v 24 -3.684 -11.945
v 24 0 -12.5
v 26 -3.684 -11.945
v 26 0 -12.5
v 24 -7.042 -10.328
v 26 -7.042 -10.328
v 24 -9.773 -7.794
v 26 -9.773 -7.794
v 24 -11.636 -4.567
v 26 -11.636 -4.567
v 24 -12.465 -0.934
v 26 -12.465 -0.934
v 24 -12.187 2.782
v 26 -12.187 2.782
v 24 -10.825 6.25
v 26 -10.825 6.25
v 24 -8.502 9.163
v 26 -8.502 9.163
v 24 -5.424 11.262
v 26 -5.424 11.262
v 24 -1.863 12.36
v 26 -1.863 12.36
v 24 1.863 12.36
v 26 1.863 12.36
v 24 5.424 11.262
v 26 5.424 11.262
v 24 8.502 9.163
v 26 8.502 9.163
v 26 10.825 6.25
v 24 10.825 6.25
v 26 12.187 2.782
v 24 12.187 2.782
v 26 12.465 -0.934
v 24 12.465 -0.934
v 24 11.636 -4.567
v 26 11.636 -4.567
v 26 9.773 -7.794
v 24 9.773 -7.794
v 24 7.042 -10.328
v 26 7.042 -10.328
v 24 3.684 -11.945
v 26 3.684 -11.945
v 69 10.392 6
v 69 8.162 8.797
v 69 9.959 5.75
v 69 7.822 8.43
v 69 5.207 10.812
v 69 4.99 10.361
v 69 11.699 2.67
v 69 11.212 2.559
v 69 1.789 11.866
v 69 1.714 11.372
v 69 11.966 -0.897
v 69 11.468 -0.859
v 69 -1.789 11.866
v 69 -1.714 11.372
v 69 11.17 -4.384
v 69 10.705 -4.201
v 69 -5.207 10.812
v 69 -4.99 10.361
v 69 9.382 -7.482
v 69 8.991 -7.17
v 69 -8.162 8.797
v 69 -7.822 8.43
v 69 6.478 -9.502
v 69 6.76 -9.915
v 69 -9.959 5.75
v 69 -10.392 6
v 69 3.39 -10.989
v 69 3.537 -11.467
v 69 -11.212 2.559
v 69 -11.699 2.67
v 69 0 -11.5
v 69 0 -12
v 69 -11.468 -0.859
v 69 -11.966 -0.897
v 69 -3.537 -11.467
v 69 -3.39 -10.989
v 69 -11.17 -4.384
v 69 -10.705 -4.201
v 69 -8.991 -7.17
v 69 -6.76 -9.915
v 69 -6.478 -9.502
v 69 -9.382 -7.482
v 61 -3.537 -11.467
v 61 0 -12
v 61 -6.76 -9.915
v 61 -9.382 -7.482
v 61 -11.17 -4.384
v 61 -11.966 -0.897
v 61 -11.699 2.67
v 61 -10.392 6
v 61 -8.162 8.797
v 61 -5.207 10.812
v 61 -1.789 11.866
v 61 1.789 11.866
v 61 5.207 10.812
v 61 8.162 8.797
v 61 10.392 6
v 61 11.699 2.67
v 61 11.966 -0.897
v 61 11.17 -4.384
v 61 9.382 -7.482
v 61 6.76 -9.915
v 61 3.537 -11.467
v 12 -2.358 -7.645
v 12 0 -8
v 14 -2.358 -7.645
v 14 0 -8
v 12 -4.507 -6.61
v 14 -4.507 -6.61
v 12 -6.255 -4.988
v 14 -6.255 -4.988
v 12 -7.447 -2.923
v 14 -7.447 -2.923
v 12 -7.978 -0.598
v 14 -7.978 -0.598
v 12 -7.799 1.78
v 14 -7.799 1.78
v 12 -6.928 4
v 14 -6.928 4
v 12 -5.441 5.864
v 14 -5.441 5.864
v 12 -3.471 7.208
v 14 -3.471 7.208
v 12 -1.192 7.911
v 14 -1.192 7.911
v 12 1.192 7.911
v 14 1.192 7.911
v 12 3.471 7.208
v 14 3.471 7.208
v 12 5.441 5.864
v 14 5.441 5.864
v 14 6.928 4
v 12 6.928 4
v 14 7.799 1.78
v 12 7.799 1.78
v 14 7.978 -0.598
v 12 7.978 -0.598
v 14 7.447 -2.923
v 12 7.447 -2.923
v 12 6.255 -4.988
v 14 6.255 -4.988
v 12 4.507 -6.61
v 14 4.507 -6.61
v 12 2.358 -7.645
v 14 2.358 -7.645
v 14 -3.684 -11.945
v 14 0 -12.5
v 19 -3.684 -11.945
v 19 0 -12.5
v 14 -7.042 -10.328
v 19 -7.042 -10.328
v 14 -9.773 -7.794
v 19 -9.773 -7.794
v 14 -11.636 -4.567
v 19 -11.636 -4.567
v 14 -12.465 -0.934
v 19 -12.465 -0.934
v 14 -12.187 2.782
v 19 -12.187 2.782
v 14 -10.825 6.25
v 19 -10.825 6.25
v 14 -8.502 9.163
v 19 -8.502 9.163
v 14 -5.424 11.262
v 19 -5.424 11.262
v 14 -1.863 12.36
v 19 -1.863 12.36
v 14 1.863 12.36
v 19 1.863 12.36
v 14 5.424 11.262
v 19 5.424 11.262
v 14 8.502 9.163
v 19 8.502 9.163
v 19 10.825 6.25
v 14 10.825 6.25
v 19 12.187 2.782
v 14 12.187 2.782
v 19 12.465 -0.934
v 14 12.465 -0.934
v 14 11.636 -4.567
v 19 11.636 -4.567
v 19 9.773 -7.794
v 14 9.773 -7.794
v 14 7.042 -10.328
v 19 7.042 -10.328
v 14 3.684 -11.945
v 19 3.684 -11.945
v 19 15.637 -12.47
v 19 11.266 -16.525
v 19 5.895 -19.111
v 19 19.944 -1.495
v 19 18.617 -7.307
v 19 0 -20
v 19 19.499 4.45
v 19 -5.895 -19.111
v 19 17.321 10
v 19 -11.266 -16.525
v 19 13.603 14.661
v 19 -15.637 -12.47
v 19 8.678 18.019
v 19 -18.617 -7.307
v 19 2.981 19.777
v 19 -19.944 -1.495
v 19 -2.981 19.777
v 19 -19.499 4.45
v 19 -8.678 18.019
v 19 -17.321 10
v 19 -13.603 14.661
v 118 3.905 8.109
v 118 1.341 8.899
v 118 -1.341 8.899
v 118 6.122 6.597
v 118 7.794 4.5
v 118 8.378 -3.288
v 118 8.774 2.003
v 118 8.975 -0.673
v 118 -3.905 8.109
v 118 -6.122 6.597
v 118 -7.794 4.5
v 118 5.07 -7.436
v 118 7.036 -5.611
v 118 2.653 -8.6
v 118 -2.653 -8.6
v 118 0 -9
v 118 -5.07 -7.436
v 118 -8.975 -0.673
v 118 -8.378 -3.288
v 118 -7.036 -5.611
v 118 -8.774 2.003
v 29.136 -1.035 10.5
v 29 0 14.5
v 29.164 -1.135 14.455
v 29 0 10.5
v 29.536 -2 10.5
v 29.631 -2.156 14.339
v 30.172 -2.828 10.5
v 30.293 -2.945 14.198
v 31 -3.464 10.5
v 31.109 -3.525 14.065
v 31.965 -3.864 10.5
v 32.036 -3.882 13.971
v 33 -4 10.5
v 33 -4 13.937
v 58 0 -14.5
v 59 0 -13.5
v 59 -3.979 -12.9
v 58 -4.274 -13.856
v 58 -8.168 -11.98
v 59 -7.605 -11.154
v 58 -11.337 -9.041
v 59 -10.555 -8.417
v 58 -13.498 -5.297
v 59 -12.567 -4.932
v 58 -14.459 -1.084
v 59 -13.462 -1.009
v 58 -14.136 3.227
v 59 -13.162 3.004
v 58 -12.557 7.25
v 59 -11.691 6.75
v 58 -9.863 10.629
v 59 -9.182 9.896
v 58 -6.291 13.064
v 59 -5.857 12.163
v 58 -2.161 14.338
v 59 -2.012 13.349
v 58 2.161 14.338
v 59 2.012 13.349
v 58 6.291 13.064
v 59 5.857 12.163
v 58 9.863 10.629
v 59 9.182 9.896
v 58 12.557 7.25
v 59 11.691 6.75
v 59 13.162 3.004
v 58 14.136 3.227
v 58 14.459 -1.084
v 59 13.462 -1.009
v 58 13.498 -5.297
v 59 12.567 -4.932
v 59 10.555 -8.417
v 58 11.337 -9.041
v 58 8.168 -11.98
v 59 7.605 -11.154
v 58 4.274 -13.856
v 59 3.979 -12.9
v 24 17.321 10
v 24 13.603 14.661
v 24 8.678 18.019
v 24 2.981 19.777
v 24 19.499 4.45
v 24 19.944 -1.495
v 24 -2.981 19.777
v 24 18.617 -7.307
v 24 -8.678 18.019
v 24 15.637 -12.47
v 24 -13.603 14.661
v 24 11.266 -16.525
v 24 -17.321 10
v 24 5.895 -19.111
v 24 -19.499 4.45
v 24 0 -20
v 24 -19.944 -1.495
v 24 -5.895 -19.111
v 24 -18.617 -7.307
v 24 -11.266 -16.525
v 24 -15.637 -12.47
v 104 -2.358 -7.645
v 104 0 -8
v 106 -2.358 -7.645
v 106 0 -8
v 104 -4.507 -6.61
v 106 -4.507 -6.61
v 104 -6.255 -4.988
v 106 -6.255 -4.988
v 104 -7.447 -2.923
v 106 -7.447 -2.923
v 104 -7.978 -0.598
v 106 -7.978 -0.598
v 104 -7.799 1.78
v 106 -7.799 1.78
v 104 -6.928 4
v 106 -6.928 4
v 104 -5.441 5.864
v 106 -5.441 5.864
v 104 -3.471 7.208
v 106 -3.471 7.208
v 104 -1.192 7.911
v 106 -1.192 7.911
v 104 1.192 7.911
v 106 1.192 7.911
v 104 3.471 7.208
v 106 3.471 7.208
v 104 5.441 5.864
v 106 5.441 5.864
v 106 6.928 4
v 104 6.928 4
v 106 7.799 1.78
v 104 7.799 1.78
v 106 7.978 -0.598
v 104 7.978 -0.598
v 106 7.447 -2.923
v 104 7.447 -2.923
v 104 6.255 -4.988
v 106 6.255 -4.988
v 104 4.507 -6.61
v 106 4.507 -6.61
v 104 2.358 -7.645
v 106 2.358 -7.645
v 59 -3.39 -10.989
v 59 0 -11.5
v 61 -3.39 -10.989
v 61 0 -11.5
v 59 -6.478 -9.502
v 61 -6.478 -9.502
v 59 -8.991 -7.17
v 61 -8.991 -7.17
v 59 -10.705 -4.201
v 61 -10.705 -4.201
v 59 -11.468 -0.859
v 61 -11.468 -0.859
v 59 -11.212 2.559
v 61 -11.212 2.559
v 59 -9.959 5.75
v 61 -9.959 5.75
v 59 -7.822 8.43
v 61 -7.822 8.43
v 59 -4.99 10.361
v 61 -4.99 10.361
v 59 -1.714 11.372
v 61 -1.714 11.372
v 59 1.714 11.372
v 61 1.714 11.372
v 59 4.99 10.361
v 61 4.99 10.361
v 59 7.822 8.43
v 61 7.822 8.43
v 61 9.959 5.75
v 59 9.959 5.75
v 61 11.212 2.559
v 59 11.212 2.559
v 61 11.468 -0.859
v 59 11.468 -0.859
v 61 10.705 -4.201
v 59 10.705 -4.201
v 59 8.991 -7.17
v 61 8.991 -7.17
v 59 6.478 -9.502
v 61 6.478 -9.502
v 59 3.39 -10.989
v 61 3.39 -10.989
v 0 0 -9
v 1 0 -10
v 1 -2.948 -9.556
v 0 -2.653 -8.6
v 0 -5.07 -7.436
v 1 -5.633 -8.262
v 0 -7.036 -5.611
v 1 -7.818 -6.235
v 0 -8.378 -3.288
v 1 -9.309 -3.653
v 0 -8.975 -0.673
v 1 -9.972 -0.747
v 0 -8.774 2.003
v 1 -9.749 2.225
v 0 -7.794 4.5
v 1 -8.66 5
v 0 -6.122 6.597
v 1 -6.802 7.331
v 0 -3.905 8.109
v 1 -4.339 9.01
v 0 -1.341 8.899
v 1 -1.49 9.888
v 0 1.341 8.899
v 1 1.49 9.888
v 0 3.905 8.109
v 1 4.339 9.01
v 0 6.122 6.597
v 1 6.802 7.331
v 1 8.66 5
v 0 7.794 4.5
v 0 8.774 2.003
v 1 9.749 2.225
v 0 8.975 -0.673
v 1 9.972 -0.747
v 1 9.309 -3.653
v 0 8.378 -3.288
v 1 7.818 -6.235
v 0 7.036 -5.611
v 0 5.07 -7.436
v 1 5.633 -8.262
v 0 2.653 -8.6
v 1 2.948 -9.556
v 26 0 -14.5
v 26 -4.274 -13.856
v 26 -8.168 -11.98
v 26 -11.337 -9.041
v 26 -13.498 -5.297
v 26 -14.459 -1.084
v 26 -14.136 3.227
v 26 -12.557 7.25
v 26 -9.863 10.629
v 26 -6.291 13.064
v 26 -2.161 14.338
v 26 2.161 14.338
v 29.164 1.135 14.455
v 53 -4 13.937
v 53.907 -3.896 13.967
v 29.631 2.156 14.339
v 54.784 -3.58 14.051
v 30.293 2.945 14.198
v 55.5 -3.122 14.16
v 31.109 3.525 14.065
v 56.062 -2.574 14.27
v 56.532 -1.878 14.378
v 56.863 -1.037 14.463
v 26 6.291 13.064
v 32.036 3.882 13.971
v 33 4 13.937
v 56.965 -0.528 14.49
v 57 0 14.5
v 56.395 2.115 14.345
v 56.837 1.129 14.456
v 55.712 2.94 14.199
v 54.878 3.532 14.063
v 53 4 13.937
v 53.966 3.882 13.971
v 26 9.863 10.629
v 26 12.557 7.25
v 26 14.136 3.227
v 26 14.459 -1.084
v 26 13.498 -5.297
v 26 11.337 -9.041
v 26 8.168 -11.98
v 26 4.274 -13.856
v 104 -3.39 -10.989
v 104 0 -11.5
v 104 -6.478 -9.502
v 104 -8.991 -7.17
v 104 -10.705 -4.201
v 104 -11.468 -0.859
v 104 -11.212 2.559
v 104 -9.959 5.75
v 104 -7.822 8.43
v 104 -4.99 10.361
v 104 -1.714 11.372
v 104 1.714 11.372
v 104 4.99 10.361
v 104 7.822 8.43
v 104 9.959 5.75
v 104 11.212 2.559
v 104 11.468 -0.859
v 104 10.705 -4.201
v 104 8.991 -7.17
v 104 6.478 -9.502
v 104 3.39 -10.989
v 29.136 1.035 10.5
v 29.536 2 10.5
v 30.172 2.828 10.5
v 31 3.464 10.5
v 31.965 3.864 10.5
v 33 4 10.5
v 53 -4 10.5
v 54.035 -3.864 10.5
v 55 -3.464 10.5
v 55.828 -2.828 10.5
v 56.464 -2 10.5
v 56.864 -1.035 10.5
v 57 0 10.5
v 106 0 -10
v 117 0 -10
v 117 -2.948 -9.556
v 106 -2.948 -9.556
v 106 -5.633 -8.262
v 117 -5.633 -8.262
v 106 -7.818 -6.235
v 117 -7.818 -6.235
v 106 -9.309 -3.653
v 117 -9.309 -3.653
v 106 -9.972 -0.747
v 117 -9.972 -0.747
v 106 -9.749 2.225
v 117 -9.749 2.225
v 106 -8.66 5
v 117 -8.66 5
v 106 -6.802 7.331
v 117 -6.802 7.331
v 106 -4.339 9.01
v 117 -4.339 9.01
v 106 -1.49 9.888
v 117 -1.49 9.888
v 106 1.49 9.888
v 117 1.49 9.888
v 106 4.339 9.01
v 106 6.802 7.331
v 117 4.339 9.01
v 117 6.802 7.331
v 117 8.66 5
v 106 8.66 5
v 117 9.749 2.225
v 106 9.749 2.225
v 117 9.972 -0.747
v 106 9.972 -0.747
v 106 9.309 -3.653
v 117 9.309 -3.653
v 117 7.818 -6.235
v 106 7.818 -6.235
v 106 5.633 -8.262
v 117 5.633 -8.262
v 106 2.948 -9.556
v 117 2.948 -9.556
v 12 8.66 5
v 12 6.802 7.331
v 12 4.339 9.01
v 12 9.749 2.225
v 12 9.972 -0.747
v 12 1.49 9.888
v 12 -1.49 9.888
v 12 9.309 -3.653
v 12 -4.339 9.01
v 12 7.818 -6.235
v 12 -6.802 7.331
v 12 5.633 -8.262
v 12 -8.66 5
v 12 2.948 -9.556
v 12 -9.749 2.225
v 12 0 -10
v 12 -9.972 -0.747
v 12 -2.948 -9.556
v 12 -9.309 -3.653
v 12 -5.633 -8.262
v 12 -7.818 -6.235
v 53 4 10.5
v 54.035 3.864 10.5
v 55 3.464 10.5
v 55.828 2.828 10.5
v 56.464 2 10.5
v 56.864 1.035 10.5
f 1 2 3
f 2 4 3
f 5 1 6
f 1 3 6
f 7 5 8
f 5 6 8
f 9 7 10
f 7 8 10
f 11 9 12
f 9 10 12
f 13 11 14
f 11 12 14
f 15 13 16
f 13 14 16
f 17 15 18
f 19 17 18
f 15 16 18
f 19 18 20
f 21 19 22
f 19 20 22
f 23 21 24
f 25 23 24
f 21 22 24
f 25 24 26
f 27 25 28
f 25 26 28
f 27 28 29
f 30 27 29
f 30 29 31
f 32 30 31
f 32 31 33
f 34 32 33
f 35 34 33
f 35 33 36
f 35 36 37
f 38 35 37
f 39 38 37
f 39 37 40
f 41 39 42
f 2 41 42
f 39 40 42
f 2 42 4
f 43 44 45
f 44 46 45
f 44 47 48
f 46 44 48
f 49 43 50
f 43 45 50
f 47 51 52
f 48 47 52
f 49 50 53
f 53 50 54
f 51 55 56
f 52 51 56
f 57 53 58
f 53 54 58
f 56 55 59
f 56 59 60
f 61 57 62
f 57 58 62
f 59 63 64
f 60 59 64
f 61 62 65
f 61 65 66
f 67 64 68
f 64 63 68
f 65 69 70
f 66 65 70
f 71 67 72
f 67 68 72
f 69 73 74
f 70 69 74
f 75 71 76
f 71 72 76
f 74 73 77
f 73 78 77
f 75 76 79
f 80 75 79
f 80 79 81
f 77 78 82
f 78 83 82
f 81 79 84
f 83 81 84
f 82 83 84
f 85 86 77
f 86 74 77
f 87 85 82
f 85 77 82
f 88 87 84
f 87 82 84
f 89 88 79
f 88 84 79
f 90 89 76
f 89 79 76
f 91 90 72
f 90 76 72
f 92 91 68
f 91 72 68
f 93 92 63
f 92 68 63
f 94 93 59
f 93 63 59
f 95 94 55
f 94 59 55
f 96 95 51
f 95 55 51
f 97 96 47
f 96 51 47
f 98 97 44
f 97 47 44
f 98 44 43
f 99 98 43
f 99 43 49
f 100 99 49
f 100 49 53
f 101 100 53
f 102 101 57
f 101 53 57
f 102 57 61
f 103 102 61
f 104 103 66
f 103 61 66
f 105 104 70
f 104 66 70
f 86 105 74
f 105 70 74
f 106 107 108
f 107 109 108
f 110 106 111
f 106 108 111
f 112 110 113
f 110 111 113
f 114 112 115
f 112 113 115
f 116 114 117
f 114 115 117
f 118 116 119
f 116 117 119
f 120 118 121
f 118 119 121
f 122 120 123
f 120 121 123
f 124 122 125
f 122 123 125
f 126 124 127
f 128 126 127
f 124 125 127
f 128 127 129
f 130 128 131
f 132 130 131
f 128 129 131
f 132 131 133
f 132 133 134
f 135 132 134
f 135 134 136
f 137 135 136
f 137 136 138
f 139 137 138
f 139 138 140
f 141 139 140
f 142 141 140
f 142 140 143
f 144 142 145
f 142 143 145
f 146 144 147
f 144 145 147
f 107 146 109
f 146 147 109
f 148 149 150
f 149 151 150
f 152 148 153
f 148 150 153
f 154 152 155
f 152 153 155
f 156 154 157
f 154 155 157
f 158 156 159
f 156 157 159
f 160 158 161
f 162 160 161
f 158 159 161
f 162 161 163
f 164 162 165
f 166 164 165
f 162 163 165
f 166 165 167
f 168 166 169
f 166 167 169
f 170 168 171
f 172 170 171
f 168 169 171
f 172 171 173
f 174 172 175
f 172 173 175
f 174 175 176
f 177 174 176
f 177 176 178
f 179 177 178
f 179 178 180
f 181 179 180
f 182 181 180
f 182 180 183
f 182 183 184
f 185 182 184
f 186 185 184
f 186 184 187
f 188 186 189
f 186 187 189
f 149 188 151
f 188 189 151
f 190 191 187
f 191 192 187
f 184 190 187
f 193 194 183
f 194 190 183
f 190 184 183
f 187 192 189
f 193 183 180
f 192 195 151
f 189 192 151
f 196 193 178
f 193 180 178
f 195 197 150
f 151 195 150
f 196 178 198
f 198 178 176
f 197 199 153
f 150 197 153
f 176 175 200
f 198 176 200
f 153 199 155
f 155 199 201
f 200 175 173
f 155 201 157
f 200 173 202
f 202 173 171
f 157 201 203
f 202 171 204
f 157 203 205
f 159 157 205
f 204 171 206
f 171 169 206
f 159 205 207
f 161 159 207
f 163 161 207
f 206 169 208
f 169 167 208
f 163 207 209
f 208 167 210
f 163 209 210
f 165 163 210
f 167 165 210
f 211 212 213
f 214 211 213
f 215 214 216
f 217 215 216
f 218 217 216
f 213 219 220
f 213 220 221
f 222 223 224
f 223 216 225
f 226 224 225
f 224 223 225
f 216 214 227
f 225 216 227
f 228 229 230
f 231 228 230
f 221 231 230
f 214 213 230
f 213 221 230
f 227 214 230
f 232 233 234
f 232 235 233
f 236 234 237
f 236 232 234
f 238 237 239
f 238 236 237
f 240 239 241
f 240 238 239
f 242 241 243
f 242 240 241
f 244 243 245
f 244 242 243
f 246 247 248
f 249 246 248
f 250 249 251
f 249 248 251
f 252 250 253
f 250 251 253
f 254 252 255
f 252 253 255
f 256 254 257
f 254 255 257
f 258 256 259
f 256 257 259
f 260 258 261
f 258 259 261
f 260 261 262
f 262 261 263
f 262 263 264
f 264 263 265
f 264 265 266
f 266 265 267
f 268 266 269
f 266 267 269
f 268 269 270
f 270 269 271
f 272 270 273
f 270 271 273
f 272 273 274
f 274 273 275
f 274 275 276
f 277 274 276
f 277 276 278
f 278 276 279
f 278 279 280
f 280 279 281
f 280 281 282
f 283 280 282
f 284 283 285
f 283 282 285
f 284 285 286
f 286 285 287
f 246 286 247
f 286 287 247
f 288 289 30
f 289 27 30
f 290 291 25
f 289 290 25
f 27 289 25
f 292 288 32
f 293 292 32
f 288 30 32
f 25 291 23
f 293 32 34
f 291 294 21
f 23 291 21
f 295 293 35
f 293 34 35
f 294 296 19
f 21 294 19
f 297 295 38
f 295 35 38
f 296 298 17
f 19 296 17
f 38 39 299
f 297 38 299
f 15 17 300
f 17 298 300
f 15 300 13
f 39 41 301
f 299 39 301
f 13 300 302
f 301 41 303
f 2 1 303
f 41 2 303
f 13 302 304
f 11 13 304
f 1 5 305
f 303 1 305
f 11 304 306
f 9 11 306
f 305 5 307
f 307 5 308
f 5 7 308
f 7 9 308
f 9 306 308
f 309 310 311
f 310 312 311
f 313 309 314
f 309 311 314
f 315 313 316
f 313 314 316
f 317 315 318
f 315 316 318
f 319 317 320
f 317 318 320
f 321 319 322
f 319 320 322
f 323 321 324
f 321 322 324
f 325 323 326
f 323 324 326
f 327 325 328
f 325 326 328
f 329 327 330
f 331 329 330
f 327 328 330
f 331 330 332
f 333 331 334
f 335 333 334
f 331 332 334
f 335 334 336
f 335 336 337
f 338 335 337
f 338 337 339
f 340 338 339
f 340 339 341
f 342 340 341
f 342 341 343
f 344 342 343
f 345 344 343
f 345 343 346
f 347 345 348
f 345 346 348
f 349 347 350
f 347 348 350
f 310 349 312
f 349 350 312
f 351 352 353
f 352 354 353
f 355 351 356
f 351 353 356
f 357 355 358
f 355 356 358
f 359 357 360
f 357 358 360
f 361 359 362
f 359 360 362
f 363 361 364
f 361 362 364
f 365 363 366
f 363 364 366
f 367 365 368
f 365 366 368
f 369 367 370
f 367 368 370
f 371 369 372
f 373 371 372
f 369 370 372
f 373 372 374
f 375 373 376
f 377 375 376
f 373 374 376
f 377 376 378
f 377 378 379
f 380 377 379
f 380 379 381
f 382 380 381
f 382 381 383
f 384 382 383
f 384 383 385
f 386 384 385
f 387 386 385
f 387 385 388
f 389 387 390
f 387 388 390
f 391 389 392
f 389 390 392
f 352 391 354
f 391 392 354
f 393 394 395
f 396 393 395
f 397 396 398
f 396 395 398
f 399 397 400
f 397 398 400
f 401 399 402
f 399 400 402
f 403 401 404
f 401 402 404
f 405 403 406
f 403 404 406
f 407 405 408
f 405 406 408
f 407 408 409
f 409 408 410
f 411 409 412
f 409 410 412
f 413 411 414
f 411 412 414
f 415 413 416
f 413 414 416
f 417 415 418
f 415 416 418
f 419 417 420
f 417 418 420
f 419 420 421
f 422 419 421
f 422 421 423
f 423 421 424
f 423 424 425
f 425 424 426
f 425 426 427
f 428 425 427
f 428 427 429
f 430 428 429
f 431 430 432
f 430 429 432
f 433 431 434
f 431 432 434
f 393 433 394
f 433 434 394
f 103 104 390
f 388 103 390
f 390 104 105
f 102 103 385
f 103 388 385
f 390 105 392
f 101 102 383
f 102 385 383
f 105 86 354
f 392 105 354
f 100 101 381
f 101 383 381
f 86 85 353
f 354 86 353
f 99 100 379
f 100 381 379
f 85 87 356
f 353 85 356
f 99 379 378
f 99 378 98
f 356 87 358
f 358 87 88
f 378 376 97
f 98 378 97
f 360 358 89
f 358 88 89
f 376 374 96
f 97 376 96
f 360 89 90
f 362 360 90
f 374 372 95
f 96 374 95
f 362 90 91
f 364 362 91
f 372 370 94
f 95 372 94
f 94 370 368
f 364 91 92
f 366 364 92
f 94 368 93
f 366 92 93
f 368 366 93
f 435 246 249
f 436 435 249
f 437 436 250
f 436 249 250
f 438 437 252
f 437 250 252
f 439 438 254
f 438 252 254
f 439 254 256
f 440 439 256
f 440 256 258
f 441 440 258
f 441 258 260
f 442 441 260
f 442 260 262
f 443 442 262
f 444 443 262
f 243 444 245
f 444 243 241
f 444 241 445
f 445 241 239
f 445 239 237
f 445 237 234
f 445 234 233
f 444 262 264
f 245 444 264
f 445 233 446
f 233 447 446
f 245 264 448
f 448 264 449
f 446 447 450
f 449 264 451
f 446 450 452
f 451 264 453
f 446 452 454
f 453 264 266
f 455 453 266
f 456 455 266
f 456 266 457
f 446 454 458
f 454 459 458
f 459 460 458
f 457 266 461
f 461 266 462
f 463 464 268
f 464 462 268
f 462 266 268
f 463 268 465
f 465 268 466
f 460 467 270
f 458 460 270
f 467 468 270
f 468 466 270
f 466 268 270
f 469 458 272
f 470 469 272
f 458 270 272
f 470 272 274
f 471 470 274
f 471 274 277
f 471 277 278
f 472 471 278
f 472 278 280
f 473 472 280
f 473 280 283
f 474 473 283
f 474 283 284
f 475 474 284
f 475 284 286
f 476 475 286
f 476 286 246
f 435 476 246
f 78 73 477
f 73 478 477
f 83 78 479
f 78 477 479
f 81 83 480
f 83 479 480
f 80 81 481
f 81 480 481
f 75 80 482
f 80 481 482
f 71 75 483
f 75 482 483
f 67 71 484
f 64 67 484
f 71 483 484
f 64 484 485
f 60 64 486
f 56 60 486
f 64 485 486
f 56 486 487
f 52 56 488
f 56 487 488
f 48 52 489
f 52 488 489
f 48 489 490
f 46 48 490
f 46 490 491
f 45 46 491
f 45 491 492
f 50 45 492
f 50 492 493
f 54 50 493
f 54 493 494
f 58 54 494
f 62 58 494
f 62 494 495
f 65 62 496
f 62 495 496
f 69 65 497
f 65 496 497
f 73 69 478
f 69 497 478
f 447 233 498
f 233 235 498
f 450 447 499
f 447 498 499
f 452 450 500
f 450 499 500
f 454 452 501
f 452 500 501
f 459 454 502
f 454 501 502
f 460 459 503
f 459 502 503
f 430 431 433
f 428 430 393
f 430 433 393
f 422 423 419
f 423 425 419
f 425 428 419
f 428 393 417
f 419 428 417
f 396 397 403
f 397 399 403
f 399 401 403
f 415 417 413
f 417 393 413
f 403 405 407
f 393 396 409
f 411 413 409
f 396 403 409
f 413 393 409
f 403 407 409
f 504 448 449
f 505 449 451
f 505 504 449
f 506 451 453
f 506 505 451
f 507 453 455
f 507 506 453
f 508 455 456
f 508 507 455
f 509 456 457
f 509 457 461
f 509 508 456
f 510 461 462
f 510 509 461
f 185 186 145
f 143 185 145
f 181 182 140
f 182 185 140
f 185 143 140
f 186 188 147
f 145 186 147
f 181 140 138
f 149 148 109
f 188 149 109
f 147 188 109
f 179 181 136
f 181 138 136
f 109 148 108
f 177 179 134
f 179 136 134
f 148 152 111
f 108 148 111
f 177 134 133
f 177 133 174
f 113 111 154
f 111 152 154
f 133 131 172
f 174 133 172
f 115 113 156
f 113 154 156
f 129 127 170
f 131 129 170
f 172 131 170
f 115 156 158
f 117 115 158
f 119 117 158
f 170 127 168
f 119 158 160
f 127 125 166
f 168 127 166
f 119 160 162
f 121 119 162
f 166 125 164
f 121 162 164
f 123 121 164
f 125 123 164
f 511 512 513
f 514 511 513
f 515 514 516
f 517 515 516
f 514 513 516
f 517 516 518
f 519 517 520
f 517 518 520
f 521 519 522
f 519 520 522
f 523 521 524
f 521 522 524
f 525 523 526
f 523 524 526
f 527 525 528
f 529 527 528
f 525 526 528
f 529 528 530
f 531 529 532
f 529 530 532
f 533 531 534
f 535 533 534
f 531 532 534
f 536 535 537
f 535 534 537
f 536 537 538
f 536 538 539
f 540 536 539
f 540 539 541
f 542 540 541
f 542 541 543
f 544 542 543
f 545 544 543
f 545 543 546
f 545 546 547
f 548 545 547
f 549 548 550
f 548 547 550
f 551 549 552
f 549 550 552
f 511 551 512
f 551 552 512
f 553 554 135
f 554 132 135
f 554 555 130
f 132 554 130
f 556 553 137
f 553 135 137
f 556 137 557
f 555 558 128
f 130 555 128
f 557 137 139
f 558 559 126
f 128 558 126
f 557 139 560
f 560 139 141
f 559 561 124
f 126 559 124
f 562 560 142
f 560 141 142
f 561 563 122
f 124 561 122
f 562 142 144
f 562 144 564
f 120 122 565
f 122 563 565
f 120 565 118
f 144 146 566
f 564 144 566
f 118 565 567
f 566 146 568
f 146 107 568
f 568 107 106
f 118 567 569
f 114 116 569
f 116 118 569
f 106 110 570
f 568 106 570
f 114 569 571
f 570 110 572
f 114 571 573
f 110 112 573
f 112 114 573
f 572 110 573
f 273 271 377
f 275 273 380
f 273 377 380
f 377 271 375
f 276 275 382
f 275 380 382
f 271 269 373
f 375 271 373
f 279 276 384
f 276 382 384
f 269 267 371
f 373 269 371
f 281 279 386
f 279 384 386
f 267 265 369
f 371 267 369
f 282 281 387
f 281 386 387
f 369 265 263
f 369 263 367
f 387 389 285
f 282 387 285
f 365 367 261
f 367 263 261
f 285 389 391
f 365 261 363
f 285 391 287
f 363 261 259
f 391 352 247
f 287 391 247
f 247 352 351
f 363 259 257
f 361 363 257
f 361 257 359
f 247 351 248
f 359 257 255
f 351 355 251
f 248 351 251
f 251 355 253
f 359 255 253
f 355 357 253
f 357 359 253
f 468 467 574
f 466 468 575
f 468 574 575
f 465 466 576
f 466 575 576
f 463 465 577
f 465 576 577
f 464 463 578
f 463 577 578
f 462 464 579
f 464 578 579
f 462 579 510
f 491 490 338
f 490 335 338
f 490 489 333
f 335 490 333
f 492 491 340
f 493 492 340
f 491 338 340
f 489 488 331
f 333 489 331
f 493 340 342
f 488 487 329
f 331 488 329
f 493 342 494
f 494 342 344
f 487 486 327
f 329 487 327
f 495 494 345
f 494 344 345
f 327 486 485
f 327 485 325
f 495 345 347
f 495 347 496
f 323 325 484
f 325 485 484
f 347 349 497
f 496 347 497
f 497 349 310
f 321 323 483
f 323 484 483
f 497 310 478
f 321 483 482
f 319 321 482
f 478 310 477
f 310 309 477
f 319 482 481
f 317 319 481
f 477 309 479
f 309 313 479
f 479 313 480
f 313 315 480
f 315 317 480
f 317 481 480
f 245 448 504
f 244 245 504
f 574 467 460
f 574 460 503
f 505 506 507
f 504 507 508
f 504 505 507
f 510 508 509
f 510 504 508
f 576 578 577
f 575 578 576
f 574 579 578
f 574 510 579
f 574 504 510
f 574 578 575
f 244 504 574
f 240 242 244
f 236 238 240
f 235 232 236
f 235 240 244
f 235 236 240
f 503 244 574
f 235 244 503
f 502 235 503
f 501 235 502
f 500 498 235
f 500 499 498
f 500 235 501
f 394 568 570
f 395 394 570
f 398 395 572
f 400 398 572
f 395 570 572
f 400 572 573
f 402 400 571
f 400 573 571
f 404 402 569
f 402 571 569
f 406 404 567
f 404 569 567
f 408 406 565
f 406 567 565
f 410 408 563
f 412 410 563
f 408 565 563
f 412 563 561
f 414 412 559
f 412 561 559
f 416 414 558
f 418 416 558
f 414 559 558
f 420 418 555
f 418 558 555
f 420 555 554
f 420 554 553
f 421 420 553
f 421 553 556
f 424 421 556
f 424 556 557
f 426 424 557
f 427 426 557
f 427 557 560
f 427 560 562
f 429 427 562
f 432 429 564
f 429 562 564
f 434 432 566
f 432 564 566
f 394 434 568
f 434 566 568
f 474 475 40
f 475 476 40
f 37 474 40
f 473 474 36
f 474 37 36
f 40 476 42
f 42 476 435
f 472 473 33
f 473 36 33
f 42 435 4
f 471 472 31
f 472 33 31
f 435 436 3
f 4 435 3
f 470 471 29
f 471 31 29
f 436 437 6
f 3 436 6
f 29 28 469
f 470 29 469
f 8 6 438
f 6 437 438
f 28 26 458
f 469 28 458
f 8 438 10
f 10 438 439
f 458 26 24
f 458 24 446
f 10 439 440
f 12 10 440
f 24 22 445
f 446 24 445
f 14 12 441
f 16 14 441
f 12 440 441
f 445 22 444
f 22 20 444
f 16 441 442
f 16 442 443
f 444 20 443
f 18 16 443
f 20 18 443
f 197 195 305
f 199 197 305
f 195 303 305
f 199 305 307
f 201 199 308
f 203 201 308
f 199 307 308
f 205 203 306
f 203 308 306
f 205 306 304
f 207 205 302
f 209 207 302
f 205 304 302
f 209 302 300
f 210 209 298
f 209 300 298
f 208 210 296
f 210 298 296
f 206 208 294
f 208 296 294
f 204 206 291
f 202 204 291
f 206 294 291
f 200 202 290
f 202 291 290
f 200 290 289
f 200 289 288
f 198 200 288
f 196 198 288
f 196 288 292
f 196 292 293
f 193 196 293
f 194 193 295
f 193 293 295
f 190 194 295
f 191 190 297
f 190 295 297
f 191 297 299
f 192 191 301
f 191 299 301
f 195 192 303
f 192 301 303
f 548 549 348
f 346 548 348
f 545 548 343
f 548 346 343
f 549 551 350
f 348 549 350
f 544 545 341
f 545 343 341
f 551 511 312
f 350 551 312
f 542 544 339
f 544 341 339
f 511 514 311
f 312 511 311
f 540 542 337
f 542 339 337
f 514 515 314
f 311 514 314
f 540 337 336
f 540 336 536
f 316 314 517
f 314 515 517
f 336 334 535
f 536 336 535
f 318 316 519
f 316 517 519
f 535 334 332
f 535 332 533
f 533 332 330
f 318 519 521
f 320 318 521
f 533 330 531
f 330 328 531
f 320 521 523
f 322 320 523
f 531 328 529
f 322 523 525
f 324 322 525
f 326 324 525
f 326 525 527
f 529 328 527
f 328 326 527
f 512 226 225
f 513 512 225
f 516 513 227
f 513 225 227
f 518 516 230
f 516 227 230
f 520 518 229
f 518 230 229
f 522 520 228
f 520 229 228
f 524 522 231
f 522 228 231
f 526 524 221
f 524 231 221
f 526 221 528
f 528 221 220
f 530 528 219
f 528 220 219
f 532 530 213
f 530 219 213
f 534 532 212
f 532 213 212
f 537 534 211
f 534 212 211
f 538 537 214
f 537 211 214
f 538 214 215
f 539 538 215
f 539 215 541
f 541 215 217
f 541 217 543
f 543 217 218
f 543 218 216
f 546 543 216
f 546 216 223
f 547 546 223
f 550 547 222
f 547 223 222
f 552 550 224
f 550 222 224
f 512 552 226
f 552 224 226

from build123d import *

# Parameters (mm, degrees)
CHAMFER_1_SIZE      = 1
SKETCH_2_W          = 5.515970317
SKETCH_2_H          = 8
CUT_EXTRUDE_1_DEPTH = 28
FILLET_1_R          = 4
FILLET_2_R          = 4


with BuildPart() as part:
    # 草图1 → 旋转1 (revolve)
    with BuildSketch(Plane.XY, mode=Mode.PRIVATE) as revolve_1_sk:
        Polygon((0, 0), (0, 10), (12, 10), (12, 8), (14, 8), (14, 12.5), (19, 12.5), (19, 20), (24, 20), (24, 12.5), (26, 12.5), (26, 14.5), (59, 14.5), (59, 11.5), (61, 11.5), (61, 12), (69, 12), (69, 11.5), (104, 11.5), (104, 8), (106, 8), (106, 10), (118, 10), (118, 0), align=None)
    revolve(revolve_1_sk.sketch.rotate(Axis((0, 0, 0), (-1, 0, 0)), 90), axis=Axis((0, 0, 0), (-1, 0, 0)))

    # 倒角1
    chamfer_1_edges = [part.edges().sort_by_distance(p)[0] for p in [
        (118, 0, 10),
        (59, 0, 14.5),
        (0, 0, 10),
    ]]
    chamfer(chamfer_1_edges, length=CHAMFER_1_SIZE)

    # 草图2 → 切除-拉伸1 (cut)
    with BuildSketch(Plane(origin=(29, 0, 0), x_dir=(0, 0, -1), z_dir=(1, 0, 0))):
        with Locations((-13.257985159, 0)):
            Rectangle(SKETCH_2_W, SKETCH_2_H)
    extrude(amount=CUT_EXTRUDE_1_DEPTH, mode=Mode.SUBTRACT)

    # 圆角1
    fillet_1_edges = [part.edges().sort_by_distance(p)[0] for p in [
        (29, 4, 12.218679932),
        (29, -4, 12.218679932),
    ]]
    fillet(fillet_1_edges, radius=FILLET_1_R - 0.0001)  # a hair under: the kernel refuses the full size

    # 圆角2
    fillet_2_edges = [part.edges().sort_by_distance(p)[0] for p in [
        (57, -4, 12.218679932),
        (57, 4, 12.218679932),
    ]]
    fillet(fillet_2_edges, radius=FILLET_2_R - 0.0001)  # a hair under: the kernel refuses the full size


solid = part.part
